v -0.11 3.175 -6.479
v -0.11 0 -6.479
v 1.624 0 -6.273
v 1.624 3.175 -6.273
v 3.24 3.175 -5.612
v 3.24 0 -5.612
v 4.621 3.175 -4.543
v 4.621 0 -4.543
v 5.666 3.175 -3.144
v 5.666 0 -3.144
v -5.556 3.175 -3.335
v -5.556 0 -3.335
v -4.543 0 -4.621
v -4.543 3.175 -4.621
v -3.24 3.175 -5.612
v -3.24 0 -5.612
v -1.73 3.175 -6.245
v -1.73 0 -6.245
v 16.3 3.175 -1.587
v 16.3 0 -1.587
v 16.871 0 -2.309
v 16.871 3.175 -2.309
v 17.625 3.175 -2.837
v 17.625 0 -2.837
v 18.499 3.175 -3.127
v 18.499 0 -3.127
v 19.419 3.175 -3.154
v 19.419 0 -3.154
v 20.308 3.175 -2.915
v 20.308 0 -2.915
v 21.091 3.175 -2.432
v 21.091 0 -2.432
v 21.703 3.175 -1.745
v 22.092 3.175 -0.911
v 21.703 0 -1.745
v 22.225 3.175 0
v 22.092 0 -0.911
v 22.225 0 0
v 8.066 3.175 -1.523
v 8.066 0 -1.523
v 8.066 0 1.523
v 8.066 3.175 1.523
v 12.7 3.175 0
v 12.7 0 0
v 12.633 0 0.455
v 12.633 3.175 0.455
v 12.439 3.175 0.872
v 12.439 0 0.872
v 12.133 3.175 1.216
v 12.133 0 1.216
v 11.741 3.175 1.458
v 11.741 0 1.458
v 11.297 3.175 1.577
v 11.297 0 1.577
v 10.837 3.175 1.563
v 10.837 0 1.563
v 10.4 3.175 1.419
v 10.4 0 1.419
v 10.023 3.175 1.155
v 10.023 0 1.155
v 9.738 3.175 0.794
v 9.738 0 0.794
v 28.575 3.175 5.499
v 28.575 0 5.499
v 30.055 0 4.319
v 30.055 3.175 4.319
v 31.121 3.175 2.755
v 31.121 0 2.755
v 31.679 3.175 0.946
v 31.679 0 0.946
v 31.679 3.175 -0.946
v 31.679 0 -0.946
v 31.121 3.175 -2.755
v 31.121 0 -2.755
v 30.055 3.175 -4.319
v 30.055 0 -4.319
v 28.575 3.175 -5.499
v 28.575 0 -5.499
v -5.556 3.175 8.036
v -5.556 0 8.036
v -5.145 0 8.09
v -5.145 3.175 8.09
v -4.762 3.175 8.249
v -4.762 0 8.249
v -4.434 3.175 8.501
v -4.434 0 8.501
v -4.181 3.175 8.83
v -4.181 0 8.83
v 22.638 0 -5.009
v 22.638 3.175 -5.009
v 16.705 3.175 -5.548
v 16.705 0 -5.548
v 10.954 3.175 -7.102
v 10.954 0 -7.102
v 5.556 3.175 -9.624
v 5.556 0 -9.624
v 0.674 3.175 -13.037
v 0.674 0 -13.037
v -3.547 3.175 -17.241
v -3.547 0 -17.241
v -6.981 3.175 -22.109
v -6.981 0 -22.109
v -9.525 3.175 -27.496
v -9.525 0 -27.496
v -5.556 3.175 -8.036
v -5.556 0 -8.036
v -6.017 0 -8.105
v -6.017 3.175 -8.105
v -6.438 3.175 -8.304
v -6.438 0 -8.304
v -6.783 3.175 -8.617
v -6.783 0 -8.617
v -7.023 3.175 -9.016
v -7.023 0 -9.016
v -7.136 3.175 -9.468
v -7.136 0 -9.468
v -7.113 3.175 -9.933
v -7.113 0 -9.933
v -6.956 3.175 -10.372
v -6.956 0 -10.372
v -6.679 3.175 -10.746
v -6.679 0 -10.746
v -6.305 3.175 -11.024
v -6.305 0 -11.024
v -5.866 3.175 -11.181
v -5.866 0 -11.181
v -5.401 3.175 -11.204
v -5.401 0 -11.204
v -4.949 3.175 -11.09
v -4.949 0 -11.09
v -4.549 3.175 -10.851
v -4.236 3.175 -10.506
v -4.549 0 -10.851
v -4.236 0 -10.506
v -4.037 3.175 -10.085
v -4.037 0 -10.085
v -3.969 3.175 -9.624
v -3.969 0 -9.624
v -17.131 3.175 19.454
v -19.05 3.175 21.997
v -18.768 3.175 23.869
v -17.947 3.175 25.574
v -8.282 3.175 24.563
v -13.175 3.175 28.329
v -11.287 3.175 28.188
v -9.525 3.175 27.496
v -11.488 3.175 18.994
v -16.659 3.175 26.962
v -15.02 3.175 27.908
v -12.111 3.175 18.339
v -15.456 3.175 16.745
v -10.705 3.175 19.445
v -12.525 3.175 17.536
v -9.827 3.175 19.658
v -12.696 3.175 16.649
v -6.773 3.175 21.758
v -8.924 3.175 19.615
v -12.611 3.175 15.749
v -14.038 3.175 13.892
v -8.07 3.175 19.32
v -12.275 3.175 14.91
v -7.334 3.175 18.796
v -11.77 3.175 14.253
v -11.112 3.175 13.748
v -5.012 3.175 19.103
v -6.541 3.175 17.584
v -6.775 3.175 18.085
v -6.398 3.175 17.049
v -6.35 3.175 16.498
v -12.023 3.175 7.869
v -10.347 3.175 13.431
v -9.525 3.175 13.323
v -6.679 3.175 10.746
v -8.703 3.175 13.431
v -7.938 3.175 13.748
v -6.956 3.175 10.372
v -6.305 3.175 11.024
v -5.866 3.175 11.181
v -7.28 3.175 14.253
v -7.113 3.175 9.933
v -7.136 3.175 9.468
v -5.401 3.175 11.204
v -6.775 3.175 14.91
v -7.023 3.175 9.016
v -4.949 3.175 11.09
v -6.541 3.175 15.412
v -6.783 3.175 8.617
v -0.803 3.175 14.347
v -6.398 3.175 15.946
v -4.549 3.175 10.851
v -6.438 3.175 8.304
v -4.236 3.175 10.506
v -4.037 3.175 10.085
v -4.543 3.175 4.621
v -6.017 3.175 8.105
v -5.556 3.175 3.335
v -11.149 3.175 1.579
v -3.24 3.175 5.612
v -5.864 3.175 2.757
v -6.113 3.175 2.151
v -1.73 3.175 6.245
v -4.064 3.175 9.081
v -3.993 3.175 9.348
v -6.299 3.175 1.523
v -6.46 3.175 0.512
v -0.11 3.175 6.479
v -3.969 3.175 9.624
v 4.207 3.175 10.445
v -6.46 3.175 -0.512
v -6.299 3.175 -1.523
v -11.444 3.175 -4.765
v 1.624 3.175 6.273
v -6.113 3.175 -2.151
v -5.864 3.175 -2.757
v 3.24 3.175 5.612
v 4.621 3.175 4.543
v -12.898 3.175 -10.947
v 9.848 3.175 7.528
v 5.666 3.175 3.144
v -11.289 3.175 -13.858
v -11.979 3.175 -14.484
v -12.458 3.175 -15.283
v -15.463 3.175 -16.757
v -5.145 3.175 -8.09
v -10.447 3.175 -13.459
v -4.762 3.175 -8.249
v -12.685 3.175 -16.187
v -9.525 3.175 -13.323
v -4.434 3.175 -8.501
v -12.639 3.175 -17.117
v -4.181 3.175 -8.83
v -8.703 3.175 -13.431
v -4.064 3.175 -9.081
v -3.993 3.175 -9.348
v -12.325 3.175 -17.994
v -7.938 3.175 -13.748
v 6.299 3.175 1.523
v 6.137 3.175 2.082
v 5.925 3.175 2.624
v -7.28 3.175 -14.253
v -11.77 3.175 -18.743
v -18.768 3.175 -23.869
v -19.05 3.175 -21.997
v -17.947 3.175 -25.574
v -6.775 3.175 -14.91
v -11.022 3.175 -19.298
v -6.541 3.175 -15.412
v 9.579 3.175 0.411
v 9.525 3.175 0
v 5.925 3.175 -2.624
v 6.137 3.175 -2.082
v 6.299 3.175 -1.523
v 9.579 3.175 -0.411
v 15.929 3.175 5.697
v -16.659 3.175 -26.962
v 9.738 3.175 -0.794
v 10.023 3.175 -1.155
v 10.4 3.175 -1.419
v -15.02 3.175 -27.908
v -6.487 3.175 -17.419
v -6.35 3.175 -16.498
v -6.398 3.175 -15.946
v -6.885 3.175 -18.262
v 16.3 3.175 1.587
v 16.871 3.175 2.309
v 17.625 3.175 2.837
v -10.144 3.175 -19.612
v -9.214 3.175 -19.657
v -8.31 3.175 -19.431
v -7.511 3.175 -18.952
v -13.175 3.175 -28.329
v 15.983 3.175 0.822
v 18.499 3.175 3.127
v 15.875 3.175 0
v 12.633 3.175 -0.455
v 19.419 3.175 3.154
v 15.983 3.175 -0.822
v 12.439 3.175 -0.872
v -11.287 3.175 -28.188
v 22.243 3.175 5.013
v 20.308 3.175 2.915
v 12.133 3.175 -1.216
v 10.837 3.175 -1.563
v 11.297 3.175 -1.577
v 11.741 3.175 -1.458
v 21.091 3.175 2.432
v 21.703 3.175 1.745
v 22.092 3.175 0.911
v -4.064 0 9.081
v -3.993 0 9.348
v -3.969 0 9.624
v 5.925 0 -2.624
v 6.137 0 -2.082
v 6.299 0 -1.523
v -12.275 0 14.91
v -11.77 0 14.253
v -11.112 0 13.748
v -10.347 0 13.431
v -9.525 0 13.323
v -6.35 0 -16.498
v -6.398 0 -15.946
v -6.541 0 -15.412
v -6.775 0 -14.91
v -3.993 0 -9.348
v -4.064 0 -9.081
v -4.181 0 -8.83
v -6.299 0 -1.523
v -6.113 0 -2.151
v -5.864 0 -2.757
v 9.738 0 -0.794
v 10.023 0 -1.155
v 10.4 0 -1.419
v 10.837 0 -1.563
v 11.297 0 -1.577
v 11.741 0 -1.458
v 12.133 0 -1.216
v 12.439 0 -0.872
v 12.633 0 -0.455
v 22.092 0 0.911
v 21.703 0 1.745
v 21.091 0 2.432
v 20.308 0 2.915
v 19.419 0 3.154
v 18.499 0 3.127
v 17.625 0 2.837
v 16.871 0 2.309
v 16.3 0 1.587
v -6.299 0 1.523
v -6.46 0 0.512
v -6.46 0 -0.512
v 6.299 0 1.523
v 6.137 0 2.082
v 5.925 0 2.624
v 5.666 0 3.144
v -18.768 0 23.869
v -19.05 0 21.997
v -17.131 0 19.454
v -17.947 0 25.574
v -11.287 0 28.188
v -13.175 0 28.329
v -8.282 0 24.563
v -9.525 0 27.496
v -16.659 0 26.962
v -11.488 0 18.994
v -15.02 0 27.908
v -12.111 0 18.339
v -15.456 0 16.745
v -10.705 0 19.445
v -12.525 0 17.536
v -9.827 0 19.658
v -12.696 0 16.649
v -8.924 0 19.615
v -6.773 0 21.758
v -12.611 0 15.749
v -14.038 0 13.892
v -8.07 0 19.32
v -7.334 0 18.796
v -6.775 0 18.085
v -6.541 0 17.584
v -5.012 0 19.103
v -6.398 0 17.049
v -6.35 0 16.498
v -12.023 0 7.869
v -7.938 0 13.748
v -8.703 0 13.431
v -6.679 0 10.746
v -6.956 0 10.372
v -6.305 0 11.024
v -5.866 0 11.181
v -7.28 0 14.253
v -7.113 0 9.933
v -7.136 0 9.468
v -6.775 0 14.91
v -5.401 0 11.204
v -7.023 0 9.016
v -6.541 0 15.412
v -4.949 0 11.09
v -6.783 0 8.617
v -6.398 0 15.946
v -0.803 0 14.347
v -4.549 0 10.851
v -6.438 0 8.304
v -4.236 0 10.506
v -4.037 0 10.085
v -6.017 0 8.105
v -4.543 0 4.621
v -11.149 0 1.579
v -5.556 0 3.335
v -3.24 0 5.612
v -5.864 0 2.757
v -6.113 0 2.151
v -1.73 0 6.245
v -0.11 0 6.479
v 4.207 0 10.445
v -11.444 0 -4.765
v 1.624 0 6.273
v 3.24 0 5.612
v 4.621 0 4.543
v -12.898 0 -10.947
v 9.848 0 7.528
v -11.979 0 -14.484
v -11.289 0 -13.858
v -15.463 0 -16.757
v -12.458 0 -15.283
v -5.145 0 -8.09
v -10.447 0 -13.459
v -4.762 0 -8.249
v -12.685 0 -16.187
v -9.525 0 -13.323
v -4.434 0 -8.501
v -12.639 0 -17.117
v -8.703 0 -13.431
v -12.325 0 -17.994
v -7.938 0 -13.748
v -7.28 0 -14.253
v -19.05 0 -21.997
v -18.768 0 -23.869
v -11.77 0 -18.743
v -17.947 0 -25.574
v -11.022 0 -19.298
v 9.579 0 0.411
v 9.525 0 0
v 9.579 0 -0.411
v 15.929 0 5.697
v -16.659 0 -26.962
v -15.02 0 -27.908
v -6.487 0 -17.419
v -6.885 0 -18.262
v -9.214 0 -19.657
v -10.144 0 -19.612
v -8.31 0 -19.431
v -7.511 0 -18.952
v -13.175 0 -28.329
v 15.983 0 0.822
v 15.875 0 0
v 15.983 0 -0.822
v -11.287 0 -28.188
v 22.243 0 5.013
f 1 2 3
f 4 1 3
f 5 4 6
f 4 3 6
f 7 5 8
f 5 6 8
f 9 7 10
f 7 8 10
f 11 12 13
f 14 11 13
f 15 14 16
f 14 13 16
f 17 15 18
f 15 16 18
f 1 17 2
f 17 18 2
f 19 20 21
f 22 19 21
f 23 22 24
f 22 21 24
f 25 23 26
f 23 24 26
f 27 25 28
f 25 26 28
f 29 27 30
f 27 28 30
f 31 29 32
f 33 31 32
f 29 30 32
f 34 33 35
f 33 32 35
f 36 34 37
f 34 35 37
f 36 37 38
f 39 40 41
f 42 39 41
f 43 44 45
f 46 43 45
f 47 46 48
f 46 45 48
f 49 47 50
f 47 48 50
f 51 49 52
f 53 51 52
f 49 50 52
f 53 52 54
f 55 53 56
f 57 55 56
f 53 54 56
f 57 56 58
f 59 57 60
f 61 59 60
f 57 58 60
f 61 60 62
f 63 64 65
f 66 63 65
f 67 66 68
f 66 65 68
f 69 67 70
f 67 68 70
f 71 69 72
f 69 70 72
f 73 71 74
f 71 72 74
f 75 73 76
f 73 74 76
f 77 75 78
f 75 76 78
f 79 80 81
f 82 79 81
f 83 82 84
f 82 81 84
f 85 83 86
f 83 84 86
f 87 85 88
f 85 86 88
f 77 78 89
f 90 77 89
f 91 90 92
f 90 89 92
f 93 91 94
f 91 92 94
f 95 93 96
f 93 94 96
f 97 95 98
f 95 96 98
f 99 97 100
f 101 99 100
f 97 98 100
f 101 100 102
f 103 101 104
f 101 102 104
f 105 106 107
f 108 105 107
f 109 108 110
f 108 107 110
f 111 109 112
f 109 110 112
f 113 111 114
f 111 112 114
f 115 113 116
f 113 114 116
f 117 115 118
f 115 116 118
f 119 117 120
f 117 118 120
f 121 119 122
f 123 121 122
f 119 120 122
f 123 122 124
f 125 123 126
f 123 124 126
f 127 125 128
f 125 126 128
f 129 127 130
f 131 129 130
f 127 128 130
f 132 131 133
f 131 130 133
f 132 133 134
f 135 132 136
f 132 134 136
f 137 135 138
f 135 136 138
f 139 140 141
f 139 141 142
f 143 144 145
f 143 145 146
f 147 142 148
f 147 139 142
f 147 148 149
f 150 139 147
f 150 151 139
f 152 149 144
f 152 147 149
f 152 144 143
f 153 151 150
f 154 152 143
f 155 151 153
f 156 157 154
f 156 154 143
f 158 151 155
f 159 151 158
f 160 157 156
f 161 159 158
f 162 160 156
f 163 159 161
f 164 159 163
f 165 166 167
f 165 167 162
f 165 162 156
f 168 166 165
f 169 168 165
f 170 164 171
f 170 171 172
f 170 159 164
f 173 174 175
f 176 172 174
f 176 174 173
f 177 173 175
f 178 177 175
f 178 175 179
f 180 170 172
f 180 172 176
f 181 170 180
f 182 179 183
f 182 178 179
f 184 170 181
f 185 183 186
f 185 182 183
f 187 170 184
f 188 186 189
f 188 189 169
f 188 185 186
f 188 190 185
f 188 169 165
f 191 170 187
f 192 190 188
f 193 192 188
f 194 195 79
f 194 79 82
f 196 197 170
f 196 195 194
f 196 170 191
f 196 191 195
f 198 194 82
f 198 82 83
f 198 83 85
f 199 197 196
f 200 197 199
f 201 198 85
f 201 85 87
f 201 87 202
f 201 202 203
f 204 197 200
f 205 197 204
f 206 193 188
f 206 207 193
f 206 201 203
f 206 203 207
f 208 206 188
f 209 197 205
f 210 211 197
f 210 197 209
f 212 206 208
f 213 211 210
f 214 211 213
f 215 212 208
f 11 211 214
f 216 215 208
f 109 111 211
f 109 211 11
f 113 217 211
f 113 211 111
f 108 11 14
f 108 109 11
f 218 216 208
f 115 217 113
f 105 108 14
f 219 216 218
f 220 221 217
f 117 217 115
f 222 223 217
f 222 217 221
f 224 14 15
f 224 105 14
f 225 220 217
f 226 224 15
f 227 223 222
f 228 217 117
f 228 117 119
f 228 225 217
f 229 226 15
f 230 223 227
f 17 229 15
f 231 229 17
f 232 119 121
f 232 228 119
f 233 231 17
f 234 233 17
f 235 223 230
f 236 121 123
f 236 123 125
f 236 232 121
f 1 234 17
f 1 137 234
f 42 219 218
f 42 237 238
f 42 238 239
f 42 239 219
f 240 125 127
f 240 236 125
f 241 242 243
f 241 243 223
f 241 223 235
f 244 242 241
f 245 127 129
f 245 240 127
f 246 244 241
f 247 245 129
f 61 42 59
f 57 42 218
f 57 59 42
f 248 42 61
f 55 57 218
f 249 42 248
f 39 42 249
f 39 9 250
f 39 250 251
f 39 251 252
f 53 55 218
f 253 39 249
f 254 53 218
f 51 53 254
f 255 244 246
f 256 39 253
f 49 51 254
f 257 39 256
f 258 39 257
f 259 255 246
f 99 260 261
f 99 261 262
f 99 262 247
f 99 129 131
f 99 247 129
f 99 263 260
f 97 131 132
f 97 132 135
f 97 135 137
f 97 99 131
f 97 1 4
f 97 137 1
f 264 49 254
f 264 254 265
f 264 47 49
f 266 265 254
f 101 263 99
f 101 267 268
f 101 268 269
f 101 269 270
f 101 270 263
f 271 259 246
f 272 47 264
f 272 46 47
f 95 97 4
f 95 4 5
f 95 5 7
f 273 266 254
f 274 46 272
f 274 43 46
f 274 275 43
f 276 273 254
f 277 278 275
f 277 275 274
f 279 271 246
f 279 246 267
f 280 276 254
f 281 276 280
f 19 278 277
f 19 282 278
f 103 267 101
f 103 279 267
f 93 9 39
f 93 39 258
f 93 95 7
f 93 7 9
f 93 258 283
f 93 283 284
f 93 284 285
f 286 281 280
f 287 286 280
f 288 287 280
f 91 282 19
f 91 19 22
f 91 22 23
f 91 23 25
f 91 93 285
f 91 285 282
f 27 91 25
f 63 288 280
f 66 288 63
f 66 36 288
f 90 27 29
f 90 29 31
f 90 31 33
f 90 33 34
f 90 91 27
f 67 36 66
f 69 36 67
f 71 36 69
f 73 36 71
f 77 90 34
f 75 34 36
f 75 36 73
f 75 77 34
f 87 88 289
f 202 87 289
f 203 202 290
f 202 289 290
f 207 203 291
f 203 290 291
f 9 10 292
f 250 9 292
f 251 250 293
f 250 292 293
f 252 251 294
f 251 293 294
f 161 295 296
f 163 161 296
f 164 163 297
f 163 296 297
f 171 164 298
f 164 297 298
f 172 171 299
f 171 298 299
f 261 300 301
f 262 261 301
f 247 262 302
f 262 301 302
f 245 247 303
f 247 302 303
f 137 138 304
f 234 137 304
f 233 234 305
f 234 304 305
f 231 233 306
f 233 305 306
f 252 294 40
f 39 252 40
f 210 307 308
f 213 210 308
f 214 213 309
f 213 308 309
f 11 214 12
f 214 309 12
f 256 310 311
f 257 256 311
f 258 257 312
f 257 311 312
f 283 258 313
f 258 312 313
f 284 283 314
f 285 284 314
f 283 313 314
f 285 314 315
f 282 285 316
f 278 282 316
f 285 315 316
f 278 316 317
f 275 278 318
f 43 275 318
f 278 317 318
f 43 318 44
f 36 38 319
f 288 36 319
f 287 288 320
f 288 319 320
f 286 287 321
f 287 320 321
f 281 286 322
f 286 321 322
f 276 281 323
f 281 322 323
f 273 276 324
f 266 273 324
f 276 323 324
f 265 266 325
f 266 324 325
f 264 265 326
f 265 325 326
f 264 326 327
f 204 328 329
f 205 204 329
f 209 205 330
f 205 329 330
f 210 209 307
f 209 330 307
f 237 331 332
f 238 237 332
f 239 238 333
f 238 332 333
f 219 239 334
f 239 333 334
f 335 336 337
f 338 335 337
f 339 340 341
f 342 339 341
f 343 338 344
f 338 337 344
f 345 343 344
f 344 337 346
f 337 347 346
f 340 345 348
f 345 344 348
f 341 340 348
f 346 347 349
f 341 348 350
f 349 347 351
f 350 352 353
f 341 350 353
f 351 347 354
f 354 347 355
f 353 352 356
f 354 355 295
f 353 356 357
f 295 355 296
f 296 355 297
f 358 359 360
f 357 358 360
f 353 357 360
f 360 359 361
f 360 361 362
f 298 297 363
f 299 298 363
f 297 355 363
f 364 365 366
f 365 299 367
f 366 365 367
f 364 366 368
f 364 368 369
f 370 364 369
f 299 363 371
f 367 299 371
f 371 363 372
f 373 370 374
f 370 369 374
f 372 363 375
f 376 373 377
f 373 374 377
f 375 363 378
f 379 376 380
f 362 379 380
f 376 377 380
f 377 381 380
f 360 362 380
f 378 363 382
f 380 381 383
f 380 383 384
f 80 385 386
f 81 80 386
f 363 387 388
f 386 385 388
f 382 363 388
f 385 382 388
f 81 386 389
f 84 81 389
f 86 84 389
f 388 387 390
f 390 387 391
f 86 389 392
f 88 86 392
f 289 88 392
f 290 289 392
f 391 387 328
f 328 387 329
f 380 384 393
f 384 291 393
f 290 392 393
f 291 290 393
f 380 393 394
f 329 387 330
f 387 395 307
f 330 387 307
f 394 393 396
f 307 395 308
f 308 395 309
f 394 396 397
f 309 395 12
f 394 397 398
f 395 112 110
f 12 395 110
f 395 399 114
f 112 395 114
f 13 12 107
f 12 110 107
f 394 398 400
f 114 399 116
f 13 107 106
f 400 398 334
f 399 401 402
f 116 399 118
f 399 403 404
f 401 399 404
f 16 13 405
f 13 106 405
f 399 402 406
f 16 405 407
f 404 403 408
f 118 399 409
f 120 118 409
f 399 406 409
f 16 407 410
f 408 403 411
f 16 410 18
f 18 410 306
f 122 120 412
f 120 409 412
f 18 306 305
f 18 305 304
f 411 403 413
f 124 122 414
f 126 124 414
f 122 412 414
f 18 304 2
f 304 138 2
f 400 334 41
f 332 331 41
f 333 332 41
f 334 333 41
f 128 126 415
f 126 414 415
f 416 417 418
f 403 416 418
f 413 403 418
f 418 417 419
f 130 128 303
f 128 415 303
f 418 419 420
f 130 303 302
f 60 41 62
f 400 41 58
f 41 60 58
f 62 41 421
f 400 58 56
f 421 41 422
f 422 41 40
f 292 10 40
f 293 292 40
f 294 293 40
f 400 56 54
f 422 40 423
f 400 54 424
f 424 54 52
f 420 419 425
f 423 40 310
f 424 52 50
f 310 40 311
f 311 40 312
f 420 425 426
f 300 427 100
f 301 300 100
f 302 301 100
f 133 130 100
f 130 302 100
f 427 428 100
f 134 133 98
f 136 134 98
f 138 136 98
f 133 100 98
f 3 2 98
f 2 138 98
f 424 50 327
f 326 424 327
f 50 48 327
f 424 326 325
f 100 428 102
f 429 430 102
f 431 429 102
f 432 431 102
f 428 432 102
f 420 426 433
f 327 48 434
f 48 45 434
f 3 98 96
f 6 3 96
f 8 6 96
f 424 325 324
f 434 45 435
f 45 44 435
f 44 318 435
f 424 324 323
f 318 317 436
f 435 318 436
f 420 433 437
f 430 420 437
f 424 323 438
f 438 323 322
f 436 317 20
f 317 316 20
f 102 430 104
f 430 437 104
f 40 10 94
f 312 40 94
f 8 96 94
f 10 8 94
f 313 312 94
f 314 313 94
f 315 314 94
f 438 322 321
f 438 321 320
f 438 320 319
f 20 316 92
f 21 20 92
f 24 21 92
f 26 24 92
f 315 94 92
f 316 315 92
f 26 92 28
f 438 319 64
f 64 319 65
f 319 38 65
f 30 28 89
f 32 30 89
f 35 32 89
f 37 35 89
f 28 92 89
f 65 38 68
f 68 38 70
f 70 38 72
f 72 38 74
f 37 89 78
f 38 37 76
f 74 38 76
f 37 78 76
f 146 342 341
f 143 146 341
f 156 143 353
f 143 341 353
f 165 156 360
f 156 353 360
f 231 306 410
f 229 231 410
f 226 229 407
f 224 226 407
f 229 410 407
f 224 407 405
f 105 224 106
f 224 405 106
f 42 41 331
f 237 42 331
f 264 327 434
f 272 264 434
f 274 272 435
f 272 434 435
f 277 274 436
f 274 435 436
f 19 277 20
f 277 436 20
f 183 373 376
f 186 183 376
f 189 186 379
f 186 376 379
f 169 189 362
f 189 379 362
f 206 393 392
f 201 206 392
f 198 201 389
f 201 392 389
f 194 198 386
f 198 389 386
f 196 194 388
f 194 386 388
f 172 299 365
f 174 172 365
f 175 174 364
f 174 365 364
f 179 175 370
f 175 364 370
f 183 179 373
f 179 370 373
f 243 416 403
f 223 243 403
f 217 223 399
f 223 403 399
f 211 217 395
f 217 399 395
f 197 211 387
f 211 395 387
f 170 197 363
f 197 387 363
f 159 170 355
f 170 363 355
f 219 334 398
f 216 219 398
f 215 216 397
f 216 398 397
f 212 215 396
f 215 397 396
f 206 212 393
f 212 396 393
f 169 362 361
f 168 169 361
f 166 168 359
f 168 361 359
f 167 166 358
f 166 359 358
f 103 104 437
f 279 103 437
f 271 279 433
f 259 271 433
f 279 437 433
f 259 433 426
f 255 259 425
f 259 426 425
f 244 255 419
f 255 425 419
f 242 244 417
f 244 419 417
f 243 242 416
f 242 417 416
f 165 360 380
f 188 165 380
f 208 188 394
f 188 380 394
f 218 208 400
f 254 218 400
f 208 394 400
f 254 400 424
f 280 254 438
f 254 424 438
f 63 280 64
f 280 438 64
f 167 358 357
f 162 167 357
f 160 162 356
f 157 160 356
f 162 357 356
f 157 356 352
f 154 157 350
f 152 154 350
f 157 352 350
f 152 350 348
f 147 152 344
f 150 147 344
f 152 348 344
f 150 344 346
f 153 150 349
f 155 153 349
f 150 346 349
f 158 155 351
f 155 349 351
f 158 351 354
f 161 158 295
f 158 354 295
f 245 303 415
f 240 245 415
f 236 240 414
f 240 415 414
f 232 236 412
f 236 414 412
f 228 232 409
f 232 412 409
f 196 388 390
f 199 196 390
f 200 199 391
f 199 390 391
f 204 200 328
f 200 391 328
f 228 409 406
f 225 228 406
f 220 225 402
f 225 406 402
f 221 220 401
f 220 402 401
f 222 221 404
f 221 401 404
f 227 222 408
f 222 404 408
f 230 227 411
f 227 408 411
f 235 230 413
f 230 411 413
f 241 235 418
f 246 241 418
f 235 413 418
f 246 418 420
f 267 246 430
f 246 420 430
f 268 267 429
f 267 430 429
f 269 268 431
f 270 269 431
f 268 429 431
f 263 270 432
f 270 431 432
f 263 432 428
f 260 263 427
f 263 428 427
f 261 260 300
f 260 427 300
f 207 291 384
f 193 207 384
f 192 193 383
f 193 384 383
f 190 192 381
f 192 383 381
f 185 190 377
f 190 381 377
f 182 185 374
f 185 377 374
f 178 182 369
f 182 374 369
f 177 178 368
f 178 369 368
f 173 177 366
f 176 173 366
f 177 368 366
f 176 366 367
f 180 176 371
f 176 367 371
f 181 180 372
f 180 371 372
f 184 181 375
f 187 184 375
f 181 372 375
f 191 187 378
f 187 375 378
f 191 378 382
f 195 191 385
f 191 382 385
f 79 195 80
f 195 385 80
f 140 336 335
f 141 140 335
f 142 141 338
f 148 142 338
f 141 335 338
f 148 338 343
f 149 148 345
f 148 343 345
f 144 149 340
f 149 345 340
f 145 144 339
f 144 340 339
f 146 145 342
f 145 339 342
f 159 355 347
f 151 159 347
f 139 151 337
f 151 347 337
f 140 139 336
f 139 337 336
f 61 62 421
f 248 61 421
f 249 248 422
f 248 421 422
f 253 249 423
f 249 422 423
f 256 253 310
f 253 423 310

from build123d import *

# Parameters (mm, degrees)
BOSS_EXTRUDE2_DEPTH = 3.175


with BuildPart() as part:
    # Sketch1 → Boss-Extrude2 (new body)
    # profile 1 of 7: a face of its own
    with BuildSketch(Plane(origin=(0, 0, 0), x_dir=(1, 0, 0), z_dir=(0, 1, 0))):
        with BuildLine():
            ThreePointArc((28.575, -5.499261314), (31.75, 0), (28.575, 5.499261314))
            ThreePointArc((28.575, 5.499261314), (5.55625, 9.6237073), (-9.525, 27.49630657))
            ThreePointArc((-9.525, 27.49630657), (-15.875, 27.49630657), (-19.05, 21.997045256))
            ThreePointArc((-19.05, 21.997045256), (-11.443597622, 4.764679711), (-14.037901317, -13.892259152))
            Line((-14.037901317, -13.892259152), (-12.274630657, -14.910283942))
            ThreePointArc((-12.274630657, -14.910283942), (-11.1125, -13.748153285), (-9.525, -13.322783942))
            Line((-9.525, -13.322783942), (-9.525, 13.322783942))
            ThreePointArc((-9.525, 13.322783942), (-11.77006403, 18.742847972), (-6.35, 16.497783942))
            ThreePointArc((-6.35, 16.497783942), (-6.458185502, 15.676033474), (-6.775369343, 14.910283942))
            Line((-6.775369343, 14.910283942), (16.300369343, 1.5875))
            ThreePointArc((16.300369343, 1.5875), (19.871750468, 3.066814498), (22.225, 0))
            ThreePointArc((22.225, 0), (19.871750468, -3.066814498), (16.300369343, -1.5875))
            Line((16.300369343, -1.5875), (-6.775369343, -14.910283942))
            ThreePointArc((-6.775369343, -14.910283942), (-6.458185502, -15.676033474), (-6.35, -16.497783942))
            ThreePointArc((-6.35, -16.497783942), (-6.458185502, -17.31953441), (-6.775369343, -18.085283942))
            Line((-6.775369343, -18.085283942), (-5.012098683, -19.103308732))
            ThreePointArc((-5.012098683, -19.103308732), (9.848132482, -7.528106395), (28.575, -5.499261314))
        make_face()
    # profile 2 of 7: a face of its own
    with BuildSketch(Plane(origin=(0, 0, 0), x_dir=(1, 0, 0), z_dir=(0, 1, 0))):
        with BuildLine():
            ThreePointArc((-9.525, -27.49630657), (-7.560164077, -23.143006881), (-5.012098683, -19.103308732))
            Line((-5.012098683, -19.103308732), (-6.775369343, -18.085283942))
            ThreePointArc((-6.775369343, -18.085283942), (-11.1125, -19.247414599), (-12.274630657, -14.910283942))
            Line((-12.274630657, -14.910283942), (-14.037901317, -13.892259152))
            ThreePointArc((-14.037901317, -13.892259152), (-16.262349841, -18.118797588), (-19.05, -21.997045256))
            ThreePointArc((-19.05, -21.997045256), (-15.875, -27.49630657), (-9.525, -27.49630657))
        make_face()
    # profile 3 of 7: a face of its own
    with BuildSketch(Plane(origin=(0, 0, 0), x_dir=(1, 0, 0), z_dir=(0, 1, 0))):
        with BuildLine():
            Line((-9.525, 13.322783942), (-9.525, -13.322783942))
            ThreePointArc((-9.525, -13.322783942), (-7.9375, -13.748153285), (-6.775369343, -14.910283942))
            Line((-6.775369343, -14.910283942), (16.300369343, -1.5875))
            ThreePointArc((16.300369343, -1.5875), (15.875, 0), (16.300369343, 1.5875))
            Line((16.300369343, 1.5875), (-6.775369343, 14.910283942))
            ThreePointArc((-6.775369343, 14.910283942), (-7.9375, 13.748153285), (-9.525, 13.322783942))
        make_face()
        with BuildLine():
            Line((-8.065819658, -1.523195628), (-8.065819658, 1.523195628))
            Line((-8.065819658, 1.523195628), (-6.298644043, 1.523195628))
            ThreePointArc((-6.298644043, 1.523195628), (-5.996260328, 2.457214638), (-5.55625, 3.334835474))
            Line((-5.55625, 3.334835474), (-5.55625, 8.0362073))
            ThreePointArc((-5.55625, 8.0362073), (-6.678782015, 10.746239315), (-3.96875, 9.6237073))
            ThreePointArc((-3.96875, 9.6237073), (-4.022842751, 9.212832065), (-4.181434671, 8.8299573))
            Line((-4.181434671, 8.8299573), (-0.109927238, 6.479271387))
            ThreePointArc((-0.109927238, 6.479271387), (3.240101916, 5.61202114), (5.666177238, 3.144435913))
            Line((5.666177238, 3.144435913), (9.737684671, 0.79375))
            ThreePointArc((9.737684671, 0.79375), (11.523375234, 1.533407249), (12.7, 0))
            ThreePointArc((12.7, 0), (11.523375234, -1.533407249), (9.737684671, -0.79375))
            Line((9.737684671, -0.79375), (5.666177238, -3.144435913))
            ThreePointArc((5.666177238, -3.144435913), (3.240101916, -5.61202114), (-0.109927238, -6.479271387))
            Line((-0.109927238, -6.479271387), (-4.181434671, -8.8299573))
            ThreePointArc((-4.181434671, -8.8299573), (-4.022842751, -9.212832065), (-3.96875, -9.6237073))
            ThreePointArc((-3.96875, -9.6237073), (-6.678782015, -10.746239315), (-5.55625, -8.0362073))
            Line((-5.55625, -8.0362073), (-5.55625, -3.334835474))
            ThreePointArc((-5.55625, -3.334835474), (-5.996260328, -2.457214638), (-6.298644043, -1.523195628))
            Line((-6.298644043, -1.523195628), (-8.065819658, -1.523195628))
        make_face(mode=Mode.SUBTRACT)
    # profile 4 of 7: a face of its own
    with BuildSketch(Plane(origin=(0, 0, 0), x_dir=(1, 0, 0), z_dir=(0, 1, 0))):
        with BuildLine():
            Line((-5.55625, 8.0362073), (-5.55625, 3.334835474))
            ThreePointArc((-5.55625, 3.334835474), (-3.240101916, 5.61202114), (-0.109927238, 6.479271387))
            Line((-0.109927238, 6.479271387), (-4.181434671, 8.8299573))
            ThreePointArc((-4.181434671, 8.8299573), (-4.7625, 8.248891971), (-5.55625, 8.0362073))
        make_face()
    # profile 5 of 7: a face of its own
    with BuildSketch(Plane(origin=(0, 0, 0), x_dir=(1, 0, 0), z_dir=(0, 1, 0))):
        with BuildLine():
            ThreePointArc((-0.109927238, -6.479271387), (-3.240101916, -5.61202114), (-5.55625, -3.334835474))
            Line((-5.55625, -3.334835474), (-5.55625, -8.0362073))
            ThreePointArc((-5.55625, -8.0362073), (-4.7625, -8.248891971), (-4.181434671, -8.8299573))
            Line((-4.181434671, -8.8299573), (-0.109927238, -6.479271387))
        make_face()
    # profile 6 of 7: a face of its own
    with BuildSketch(Plane(origin=(0, 0, 0), x_dir=(1, 0, 0), z_dir=(0, 1, 0))):
        with BuildLine():
            ThreePointArc((5.666177238, 3.144435913), (6.037080593, 2.355143226), (6.298644043, 1.523195628))
            Line((6.298644043, 1.523195628), (8.065819658, 1.523195628))
            Line((8.065819658, 1.523195628), (8.065819658, -1.523195628))
            Line((8.065819658, -1.523195628), (6.298644043, -1.523195628))
            ThreePointArc((6.298644043, -1.523195628), (6.037080593, -2.355143226), (5.666177238, -3.144435913))
            Line((5.666177238, -3.144435913), (9.737684671, -0.79375))
            ThreePointArc((9.737684671, -0.79375), (9.525, 0), (9.737684671, 0.79375))
            Line((9.737684671, 0.79375), (5.666177238, 3.144435913))
        make_face()
    # profile 7 of 7: a face of its own
    with BuildSketch(Plane(origin=(0, 0, 0), x_dir=(1, 0, 0), z_dir=(0, 1, 0))):
        with BuildLine():
            Line((-6.298644043, 1.523195628), (-8.065819658, 1.523195628))
            Line((-8.065819658, 1.523195628), (-8.065819658, -1.523195628))
            Line((-8.065819658, -1.523195628), (-6.298644043, -1.523195628))
            ThreePointArc((-6.298644043, -1.523195628), (-6.480203832, 0), (-6.298644043, 1.523195628))
        make_face()
    extrude(amount=BOSS_EXTRUDE2_DEPTH)


solid = part.part
